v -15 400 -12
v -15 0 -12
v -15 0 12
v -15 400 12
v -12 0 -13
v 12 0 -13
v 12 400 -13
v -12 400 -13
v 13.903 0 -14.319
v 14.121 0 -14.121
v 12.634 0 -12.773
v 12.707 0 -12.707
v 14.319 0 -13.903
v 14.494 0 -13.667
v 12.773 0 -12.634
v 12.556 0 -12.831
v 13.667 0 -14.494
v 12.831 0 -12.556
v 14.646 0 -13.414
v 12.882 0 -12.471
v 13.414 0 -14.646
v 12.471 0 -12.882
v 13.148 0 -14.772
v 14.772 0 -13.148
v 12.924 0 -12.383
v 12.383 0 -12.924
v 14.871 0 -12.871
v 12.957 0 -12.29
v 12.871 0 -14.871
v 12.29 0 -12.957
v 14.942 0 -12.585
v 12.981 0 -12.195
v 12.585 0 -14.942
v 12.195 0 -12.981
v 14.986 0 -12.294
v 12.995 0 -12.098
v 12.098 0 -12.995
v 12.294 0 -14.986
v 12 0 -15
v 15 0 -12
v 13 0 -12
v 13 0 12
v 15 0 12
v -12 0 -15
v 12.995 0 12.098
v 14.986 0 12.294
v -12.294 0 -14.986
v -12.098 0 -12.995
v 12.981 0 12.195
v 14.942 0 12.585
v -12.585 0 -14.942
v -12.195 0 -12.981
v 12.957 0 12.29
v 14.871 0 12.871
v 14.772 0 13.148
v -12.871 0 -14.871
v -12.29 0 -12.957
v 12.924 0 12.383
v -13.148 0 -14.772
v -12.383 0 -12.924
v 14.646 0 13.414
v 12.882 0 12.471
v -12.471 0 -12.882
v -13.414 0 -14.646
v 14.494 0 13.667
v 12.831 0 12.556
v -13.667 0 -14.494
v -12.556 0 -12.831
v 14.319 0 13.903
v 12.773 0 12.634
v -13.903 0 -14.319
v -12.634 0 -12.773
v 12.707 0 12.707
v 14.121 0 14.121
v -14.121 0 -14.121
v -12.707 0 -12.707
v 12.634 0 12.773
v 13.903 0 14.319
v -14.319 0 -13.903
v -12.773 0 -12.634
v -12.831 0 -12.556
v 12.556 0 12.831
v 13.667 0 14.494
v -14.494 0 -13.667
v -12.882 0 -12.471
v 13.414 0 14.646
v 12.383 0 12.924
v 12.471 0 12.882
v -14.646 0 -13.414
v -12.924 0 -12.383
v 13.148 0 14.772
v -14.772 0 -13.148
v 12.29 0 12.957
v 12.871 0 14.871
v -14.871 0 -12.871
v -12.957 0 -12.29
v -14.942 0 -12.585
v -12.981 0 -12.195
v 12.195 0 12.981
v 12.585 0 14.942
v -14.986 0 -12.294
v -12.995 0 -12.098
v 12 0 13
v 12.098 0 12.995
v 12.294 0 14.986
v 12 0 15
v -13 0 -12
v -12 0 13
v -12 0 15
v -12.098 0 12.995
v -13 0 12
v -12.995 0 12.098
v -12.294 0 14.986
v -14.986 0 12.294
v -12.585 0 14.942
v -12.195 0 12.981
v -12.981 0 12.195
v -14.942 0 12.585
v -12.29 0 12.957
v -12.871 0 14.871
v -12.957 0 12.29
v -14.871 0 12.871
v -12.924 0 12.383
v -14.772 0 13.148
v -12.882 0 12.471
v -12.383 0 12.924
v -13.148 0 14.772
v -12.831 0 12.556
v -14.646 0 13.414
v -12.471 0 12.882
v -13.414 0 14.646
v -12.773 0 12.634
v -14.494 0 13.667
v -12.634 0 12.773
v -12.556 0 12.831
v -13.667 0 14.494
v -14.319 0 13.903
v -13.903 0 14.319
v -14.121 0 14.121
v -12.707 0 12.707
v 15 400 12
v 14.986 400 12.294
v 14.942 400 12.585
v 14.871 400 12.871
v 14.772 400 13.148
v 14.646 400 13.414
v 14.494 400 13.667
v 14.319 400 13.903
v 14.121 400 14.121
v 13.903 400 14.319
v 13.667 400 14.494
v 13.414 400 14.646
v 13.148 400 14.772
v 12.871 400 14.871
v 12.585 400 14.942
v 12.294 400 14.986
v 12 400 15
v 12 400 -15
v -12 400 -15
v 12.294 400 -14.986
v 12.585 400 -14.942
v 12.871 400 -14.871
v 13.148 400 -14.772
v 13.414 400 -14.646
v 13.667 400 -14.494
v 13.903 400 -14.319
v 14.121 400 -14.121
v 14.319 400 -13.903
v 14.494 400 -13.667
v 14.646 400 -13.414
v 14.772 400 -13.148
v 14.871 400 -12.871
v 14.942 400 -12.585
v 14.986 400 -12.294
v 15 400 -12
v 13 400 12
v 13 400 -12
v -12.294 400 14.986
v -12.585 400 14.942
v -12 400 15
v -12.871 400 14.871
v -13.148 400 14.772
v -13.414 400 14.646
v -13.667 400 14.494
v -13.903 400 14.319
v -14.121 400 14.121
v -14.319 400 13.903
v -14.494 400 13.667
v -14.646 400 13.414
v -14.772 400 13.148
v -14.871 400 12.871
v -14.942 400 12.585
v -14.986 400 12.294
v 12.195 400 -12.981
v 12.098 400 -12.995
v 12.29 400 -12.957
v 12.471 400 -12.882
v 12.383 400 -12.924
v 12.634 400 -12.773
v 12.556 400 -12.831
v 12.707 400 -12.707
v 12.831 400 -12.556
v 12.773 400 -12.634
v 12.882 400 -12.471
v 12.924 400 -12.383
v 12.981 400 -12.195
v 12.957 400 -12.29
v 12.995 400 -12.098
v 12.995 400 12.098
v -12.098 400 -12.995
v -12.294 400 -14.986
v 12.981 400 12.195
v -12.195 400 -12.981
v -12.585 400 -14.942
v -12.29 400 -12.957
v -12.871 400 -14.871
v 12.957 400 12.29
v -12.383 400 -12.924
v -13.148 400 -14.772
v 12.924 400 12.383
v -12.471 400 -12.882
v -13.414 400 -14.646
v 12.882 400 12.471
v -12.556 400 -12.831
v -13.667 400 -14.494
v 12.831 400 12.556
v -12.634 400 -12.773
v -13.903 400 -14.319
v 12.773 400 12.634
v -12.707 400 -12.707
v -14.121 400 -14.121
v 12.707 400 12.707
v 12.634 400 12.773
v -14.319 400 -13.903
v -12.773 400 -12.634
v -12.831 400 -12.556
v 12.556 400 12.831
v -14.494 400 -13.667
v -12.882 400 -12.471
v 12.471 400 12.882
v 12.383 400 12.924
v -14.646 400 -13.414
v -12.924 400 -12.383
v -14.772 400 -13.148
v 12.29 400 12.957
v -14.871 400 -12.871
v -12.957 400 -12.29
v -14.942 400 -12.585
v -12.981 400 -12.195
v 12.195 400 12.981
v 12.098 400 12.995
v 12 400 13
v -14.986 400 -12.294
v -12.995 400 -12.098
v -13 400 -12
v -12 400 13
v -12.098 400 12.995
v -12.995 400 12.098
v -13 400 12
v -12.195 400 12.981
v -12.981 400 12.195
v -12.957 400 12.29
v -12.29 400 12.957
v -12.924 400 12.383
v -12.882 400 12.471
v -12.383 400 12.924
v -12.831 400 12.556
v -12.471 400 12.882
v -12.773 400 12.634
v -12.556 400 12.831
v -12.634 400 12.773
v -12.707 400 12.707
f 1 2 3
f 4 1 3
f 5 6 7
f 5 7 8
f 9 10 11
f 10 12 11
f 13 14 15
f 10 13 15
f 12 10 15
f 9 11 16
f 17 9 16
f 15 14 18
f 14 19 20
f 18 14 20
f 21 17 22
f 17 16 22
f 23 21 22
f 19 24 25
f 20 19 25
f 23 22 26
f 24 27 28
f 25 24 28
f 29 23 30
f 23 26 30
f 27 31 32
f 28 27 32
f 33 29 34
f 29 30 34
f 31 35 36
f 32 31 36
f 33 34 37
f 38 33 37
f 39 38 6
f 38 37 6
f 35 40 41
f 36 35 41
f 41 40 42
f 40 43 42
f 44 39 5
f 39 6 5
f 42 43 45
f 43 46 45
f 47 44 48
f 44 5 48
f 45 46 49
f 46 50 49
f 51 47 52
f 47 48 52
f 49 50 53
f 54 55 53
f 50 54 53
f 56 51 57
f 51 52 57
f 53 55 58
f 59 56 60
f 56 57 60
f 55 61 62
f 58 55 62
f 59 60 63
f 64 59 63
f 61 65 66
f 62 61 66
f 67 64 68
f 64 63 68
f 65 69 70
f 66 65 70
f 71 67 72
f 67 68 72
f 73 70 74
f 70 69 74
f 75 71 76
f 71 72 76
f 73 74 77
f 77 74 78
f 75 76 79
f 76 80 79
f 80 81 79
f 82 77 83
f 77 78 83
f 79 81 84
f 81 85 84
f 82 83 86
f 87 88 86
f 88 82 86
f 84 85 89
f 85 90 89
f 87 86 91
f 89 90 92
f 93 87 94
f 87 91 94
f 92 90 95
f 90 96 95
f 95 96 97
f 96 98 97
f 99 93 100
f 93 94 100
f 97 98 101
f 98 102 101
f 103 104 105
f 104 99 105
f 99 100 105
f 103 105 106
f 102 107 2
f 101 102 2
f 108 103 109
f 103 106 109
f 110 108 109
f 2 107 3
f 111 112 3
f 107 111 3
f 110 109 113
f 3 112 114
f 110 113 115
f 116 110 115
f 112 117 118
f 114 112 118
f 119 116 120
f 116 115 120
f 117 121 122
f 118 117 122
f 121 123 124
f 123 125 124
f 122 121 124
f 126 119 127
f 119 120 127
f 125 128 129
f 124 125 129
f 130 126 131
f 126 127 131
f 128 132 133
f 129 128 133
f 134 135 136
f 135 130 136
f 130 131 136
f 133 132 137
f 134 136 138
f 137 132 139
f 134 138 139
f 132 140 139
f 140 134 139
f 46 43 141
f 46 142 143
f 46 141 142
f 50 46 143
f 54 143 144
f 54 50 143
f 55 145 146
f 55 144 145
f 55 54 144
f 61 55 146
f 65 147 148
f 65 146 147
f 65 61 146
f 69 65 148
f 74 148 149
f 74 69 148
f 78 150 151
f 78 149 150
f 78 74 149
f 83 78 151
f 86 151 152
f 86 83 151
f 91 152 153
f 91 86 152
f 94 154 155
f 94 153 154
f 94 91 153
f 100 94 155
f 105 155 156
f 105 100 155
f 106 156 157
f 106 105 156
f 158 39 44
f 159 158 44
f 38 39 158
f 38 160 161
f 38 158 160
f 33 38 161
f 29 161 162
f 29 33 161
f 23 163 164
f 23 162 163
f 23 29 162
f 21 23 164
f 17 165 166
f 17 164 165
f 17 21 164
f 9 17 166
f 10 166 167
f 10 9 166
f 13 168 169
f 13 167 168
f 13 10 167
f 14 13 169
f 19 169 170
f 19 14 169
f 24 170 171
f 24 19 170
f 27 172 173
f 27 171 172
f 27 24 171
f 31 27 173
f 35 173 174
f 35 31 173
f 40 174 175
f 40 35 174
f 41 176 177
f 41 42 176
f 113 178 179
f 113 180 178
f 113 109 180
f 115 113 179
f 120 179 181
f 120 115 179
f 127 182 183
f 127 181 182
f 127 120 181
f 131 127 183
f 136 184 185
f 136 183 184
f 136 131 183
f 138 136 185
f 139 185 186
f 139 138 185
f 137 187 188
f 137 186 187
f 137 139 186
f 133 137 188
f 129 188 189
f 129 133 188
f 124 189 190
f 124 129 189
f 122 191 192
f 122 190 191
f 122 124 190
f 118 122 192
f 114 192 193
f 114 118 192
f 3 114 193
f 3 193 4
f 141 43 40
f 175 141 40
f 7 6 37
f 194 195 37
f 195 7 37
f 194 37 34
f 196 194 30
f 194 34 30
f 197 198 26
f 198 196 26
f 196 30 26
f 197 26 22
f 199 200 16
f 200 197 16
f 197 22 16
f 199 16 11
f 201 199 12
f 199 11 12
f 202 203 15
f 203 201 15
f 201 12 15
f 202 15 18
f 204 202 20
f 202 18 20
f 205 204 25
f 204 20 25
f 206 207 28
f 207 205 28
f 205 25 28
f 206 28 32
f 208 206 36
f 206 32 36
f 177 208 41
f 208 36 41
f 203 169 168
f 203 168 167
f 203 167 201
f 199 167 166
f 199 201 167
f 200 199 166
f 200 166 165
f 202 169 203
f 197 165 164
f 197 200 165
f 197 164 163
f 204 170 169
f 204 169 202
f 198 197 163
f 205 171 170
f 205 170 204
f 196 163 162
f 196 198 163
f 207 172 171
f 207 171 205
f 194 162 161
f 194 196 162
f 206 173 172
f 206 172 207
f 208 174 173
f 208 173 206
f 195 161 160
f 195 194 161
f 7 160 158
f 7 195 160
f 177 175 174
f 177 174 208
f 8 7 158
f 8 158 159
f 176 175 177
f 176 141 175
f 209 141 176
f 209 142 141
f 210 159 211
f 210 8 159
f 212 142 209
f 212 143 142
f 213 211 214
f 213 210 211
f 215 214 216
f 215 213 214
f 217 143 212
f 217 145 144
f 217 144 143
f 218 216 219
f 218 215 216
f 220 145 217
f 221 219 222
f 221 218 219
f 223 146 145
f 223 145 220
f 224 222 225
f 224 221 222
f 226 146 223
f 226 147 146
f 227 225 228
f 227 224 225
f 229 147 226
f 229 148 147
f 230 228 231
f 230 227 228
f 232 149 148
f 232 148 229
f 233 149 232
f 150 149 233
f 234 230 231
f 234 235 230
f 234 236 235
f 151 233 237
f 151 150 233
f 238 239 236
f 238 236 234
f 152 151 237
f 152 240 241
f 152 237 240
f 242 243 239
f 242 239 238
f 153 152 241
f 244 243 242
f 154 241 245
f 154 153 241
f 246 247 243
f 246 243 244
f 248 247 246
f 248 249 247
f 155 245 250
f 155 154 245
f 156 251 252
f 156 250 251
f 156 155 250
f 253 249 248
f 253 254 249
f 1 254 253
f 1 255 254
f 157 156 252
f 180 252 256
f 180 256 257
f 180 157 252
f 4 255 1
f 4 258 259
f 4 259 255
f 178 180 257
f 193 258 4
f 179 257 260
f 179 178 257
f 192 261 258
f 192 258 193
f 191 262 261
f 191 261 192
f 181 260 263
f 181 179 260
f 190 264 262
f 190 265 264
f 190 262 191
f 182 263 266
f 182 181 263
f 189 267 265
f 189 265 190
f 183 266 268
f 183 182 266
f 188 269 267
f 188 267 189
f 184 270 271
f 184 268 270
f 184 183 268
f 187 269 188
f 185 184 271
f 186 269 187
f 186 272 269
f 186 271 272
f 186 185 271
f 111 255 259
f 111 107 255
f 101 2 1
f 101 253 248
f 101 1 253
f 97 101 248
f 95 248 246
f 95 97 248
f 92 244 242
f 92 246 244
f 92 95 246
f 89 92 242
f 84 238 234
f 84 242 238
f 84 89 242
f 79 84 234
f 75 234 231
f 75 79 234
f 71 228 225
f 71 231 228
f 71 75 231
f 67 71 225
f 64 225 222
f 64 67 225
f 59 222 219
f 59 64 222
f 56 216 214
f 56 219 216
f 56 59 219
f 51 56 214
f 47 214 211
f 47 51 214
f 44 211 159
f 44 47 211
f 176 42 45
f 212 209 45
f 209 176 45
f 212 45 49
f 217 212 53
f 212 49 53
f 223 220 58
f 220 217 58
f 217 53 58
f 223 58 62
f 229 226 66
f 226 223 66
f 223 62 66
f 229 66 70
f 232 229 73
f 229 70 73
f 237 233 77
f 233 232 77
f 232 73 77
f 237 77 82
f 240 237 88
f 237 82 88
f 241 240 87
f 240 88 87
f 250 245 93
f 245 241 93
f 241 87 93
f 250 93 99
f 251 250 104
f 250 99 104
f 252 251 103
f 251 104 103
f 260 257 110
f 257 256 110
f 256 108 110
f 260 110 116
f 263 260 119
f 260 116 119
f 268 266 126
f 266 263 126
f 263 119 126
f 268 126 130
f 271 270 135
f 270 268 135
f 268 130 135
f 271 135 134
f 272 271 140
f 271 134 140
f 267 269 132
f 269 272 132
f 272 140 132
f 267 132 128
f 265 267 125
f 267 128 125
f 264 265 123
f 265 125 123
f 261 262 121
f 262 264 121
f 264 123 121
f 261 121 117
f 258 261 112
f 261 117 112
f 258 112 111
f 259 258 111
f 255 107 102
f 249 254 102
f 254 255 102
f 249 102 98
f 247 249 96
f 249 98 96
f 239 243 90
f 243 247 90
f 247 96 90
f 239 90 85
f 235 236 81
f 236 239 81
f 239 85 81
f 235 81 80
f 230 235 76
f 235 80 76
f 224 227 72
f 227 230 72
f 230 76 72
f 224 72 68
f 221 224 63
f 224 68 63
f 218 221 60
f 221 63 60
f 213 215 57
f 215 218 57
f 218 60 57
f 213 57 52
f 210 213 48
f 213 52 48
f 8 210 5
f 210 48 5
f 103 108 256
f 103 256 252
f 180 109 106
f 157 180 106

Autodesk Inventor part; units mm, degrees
ref_plane "YZ Plane" through (0, 0, 0) normal (1, 0, 0) x (0, 1, 0)
ref_plane "XZ Plane" through (0, 0, 0) normal (0, 1, 0) x (-1, 0, 0)
sketch "Sketch1" plane through (0, 0, 0) normal (0, 1, 0) x (-1, 0, 0)
  line L0 (-12, 14) -> (12, 14) construction
  line L1 (14, 12) -> (14, -12) construction
  line L2 (12, -14) -> (-12, -14) construction
  line L3 (-14, -12) -> (-14, 12) construction
  line L4 (-14, 14) -> (14, -14) construction
  line L5 (14, 14) -> (-14, -14) construction
  arc A0 (14, 12) -> (12, 14) centre (12, 12) ccw construction
  arc A1 (12, -14) -> (14, -12) centre (12, -12) ccw construction
  arc A2 (-14, -12) -> (-12, -14) centre (-12, -12) ccw construction
  arc A3 (-12, 14) -> (-14, 12) centre (-12, 12) ccw construction
  line L6 (-12, -15) -> (12, -15)
  arc A4 (12, -15) -> (15, -12) centre (12, -12) ccw
  line L7 (15, -12) -> (15, 12)
  arc A5 (15, 12) -> (12, 15) centre (12, 12) ccw
  line L8 (12, 15) -> (-12, 15)
  arc A6 (-12, 15) -> (-15, 12) centre (-12, 12) ccw
  line L9 (-15, 12) -> (-15, -12)
  arc A7 (-15, -12) -> (-12, -15) centre (-12, -12) ccw
  line L10 (13, -12) -> (13, 12)
  arc A8 (13, 12) -> (12, 13) centre (12, 12) ccw
  line L11 (12, 13) -> (-12, 13)
  arc A9 (-12, 13) -> (-13, 12) centre (-12, 12) ccw
  line L12 (-13, 12) -> (-13, -12)
  arc A10 (-13, -12) -> (-12, -13) centre (-12, -12) ccw
  line L13 (-12, -13) -> (12, -13)
  arc A11 (12, -13) -> (13, -12) centre (12, -12) ccw
  point P0 (0, 0)
  point P1 (0, 0)
  point P2 (0, 0)
  dimension "d10" = 2
  dimension "depth" = 30
  dimension "width" = 30
  dimension "thickness" = 2
extrude "Extrusion1" add sketch "Sketch1" along normal blind 400
ref_plane "Work Plane1" through (0, 200, 0) normal (0, -1, 0) x (1, 0, 0)
equation "\"d10\" = thickness"
properties part number "podest duzy profil 8" material "Steel"
